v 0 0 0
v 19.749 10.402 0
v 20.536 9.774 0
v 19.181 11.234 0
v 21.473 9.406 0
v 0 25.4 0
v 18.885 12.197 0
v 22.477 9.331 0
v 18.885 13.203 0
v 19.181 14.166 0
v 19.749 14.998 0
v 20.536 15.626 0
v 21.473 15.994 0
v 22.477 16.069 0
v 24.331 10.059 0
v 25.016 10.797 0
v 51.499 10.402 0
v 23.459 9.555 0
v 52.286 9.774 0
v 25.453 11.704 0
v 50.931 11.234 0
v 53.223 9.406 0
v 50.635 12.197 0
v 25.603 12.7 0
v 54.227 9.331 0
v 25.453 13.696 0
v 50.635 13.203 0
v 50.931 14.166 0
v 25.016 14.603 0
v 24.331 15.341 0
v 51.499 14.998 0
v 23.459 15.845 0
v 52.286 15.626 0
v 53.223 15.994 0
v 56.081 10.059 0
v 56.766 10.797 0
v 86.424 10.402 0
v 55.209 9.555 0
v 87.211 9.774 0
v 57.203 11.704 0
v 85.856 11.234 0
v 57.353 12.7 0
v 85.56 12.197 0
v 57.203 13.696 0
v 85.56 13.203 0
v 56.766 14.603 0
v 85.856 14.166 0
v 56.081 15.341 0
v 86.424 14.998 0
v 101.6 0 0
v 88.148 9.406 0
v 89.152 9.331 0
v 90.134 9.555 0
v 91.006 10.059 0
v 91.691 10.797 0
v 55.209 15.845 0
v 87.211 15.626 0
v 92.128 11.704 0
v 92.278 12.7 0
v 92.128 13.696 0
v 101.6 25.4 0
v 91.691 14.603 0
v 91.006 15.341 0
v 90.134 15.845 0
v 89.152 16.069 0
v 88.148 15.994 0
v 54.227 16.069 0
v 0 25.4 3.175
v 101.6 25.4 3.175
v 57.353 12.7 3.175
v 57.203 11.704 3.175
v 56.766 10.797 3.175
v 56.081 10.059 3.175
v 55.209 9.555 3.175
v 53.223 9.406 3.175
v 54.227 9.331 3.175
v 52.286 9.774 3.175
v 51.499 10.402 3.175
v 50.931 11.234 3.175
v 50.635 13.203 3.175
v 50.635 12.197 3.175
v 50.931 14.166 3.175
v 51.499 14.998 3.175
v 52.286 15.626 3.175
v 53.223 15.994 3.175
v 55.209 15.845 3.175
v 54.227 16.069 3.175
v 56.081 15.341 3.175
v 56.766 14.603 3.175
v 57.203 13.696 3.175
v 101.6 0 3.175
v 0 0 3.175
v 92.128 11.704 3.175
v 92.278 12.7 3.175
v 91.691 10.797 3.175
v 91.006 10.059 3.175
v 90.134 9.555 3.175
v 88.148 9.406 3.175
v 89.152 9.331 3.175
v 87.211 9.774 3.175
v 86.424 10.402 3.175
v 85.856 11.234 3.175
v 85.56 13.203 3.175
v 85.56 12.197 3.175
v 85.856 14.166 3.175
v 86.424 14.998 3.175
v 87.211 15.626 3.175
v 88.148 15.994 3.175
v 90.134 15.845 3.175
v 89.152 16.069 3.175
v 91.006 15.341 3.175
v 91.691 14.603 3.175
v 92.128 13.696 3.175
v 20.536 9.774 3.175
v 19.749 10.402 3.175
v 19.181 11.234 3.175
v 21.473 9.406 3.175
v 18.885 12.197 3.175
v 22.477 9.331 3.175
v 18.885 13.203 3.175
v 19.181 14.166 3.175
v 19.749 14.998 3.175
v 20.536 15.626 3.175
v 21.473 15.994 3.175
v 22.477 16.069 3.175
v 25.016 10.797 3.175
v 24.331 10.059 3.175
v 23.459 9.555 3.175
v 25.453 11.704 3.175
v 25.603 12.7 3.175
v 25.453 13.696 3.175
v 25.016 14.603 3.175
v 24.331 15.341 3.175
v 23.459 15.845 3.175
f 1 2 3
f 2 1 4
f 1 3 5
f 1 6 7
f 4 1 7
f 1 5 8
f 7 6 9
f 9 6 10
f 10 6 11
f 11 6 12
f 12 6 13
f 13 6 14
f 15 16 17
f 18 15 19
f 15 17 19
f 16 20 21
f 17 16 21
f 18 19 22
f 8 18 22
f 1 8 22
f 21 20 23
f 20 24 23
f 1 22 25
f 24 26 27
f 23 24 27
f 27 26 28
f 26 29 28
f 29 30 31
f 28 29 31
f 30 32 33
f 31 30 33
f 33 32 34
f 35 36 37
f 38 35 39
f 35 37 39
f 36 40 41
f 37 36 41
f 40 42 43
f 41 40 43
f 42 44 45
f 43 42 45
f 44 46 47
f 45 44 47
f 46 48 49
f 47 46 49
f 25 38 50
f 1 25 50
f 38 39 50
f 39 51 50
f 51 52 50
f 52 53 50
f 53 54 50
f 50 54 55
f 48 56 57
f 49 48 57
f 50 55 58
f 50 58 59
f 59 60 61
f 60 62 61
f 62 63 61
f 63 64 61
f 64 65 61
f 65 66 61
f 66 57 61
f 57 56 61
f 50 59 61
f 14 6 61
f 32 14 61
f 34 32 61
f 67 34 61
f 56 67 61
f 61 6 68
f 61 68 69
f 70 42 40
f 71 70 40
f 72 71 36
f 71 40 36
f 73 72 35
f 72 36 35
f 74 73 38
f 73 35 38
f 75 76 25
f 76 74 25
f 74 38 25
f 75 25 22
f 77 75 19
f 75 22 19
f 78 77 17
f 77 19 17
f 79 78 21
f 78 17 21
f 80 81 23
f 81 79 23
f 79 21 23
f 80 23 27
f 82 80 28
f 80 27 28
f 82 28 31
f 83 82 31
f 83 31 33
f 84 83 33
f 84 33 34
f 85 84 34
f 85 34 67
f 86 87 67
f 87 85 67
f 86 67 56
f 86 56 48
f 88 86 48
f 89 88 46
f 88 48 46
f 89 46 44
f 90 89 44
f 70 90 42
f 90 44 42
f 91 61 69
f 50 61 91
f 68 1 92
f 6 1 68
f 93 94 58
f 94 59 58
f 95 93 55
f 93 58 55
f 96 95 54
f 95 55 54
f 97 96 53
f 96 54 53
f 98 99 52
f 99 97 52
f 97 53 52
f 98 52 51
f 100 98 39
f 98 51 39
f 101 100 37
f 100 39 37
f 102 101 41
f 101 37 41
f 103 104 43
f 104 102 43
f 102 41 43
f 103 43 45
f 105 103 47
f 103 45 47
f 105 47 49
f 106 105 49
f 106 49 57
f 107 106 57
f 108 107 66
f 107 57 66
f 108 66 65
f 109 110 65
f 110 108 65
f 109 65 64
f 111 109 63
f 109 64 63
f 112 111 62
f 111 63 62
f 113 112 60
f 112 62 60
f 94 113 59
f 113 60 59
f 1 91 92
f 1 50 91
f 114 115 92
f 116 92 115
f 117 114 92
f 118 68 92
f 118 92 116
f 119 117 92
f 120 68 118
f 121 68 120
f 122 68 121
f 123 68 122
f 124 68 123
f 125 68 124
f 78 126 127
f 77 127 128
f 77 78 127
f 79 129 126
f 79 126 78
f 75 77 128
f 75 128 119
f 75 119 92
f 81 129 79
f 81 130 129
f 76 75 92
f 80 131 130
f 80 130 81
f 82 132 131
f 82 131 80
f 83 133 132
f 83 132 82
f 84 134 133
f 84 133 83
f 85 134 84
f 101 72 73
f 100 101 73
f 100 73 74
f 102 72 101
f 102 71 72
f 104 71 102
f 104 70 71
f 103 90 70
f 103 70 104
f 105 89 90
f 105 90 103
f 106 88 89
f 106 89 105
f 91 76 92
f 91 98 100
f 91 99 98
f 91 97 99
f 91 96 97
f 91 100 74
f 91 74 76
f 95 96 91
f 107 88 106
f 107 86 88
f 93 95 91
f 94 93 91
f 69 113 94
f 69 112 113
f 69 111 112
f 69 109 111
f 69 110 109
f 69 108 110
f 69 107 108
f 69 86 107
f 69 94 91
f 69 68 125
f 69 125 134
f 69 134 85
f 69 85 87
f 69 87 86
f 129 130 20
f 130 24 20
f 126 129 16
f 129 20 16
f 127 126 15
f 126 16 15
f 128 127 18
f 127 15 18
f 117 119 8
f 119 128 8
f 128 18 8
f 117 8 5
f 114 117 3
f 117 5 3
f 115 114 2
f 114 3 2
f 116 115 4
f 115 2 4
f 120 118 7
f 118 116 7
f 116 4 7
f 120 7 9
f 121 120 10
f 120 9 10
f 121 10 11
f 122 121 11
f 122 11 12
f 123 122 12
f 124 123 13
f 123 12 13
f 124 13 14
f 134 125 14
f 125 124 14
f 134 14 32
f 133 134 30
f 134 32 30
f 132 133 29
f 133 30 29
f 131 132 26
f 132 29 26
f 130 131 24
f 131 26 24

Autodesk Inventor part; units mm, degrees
ref_plane "YZ Plane" through (0, 0, 0) normal (1, 0, 0) x (0, 1, 0)
ref_plane "XZ Plane" through (0, 0, 0) normal (0, 1, 0) x (-1, 0, 0)
ref_plane "XY Plane" through (0, 0, 0) normal (0, 0, 1) x (1, 0, 0)
sketch "Sketch1" plane through (0, 0, 0) normal (0, 0, 1) x (1, 0, 0)
  line L0 (0, 0) -> (0, 25.4)
  line L1 (0, 25.4) -> (101.6, 25.4)
  line L2 (101.6, 25.4) -> (101.6, 0)
  line L3 (101.6, 0) -> (0, 0)
  circle A0 centre (22.225, 12.7) radius 3.3782
  circle A1 centre (88.9, 12.7) radius 3.3782
  circle A2 centre (53.975, 12.7) radius 3.3782
  dimension "d0" = 25.4
  dimension "d1" = 101.6
  dimension "d2" = 6.7564
  dimension "d3" = 6.7564
  dimension "d4" = 22.225
  dimension "d5" = 12.7
  dimension "d6" = 12.7
  dimension "d7" = 12.7
  dimension "d10" = 6.7564
  dimension "d11" = 31.75
  dimension "d14" = 12.7
extrude "Extrusion2" add sketch "Sketch1" along normal blind 3.175
properties part number "Gusset 3" material "Aluminum 6061"
